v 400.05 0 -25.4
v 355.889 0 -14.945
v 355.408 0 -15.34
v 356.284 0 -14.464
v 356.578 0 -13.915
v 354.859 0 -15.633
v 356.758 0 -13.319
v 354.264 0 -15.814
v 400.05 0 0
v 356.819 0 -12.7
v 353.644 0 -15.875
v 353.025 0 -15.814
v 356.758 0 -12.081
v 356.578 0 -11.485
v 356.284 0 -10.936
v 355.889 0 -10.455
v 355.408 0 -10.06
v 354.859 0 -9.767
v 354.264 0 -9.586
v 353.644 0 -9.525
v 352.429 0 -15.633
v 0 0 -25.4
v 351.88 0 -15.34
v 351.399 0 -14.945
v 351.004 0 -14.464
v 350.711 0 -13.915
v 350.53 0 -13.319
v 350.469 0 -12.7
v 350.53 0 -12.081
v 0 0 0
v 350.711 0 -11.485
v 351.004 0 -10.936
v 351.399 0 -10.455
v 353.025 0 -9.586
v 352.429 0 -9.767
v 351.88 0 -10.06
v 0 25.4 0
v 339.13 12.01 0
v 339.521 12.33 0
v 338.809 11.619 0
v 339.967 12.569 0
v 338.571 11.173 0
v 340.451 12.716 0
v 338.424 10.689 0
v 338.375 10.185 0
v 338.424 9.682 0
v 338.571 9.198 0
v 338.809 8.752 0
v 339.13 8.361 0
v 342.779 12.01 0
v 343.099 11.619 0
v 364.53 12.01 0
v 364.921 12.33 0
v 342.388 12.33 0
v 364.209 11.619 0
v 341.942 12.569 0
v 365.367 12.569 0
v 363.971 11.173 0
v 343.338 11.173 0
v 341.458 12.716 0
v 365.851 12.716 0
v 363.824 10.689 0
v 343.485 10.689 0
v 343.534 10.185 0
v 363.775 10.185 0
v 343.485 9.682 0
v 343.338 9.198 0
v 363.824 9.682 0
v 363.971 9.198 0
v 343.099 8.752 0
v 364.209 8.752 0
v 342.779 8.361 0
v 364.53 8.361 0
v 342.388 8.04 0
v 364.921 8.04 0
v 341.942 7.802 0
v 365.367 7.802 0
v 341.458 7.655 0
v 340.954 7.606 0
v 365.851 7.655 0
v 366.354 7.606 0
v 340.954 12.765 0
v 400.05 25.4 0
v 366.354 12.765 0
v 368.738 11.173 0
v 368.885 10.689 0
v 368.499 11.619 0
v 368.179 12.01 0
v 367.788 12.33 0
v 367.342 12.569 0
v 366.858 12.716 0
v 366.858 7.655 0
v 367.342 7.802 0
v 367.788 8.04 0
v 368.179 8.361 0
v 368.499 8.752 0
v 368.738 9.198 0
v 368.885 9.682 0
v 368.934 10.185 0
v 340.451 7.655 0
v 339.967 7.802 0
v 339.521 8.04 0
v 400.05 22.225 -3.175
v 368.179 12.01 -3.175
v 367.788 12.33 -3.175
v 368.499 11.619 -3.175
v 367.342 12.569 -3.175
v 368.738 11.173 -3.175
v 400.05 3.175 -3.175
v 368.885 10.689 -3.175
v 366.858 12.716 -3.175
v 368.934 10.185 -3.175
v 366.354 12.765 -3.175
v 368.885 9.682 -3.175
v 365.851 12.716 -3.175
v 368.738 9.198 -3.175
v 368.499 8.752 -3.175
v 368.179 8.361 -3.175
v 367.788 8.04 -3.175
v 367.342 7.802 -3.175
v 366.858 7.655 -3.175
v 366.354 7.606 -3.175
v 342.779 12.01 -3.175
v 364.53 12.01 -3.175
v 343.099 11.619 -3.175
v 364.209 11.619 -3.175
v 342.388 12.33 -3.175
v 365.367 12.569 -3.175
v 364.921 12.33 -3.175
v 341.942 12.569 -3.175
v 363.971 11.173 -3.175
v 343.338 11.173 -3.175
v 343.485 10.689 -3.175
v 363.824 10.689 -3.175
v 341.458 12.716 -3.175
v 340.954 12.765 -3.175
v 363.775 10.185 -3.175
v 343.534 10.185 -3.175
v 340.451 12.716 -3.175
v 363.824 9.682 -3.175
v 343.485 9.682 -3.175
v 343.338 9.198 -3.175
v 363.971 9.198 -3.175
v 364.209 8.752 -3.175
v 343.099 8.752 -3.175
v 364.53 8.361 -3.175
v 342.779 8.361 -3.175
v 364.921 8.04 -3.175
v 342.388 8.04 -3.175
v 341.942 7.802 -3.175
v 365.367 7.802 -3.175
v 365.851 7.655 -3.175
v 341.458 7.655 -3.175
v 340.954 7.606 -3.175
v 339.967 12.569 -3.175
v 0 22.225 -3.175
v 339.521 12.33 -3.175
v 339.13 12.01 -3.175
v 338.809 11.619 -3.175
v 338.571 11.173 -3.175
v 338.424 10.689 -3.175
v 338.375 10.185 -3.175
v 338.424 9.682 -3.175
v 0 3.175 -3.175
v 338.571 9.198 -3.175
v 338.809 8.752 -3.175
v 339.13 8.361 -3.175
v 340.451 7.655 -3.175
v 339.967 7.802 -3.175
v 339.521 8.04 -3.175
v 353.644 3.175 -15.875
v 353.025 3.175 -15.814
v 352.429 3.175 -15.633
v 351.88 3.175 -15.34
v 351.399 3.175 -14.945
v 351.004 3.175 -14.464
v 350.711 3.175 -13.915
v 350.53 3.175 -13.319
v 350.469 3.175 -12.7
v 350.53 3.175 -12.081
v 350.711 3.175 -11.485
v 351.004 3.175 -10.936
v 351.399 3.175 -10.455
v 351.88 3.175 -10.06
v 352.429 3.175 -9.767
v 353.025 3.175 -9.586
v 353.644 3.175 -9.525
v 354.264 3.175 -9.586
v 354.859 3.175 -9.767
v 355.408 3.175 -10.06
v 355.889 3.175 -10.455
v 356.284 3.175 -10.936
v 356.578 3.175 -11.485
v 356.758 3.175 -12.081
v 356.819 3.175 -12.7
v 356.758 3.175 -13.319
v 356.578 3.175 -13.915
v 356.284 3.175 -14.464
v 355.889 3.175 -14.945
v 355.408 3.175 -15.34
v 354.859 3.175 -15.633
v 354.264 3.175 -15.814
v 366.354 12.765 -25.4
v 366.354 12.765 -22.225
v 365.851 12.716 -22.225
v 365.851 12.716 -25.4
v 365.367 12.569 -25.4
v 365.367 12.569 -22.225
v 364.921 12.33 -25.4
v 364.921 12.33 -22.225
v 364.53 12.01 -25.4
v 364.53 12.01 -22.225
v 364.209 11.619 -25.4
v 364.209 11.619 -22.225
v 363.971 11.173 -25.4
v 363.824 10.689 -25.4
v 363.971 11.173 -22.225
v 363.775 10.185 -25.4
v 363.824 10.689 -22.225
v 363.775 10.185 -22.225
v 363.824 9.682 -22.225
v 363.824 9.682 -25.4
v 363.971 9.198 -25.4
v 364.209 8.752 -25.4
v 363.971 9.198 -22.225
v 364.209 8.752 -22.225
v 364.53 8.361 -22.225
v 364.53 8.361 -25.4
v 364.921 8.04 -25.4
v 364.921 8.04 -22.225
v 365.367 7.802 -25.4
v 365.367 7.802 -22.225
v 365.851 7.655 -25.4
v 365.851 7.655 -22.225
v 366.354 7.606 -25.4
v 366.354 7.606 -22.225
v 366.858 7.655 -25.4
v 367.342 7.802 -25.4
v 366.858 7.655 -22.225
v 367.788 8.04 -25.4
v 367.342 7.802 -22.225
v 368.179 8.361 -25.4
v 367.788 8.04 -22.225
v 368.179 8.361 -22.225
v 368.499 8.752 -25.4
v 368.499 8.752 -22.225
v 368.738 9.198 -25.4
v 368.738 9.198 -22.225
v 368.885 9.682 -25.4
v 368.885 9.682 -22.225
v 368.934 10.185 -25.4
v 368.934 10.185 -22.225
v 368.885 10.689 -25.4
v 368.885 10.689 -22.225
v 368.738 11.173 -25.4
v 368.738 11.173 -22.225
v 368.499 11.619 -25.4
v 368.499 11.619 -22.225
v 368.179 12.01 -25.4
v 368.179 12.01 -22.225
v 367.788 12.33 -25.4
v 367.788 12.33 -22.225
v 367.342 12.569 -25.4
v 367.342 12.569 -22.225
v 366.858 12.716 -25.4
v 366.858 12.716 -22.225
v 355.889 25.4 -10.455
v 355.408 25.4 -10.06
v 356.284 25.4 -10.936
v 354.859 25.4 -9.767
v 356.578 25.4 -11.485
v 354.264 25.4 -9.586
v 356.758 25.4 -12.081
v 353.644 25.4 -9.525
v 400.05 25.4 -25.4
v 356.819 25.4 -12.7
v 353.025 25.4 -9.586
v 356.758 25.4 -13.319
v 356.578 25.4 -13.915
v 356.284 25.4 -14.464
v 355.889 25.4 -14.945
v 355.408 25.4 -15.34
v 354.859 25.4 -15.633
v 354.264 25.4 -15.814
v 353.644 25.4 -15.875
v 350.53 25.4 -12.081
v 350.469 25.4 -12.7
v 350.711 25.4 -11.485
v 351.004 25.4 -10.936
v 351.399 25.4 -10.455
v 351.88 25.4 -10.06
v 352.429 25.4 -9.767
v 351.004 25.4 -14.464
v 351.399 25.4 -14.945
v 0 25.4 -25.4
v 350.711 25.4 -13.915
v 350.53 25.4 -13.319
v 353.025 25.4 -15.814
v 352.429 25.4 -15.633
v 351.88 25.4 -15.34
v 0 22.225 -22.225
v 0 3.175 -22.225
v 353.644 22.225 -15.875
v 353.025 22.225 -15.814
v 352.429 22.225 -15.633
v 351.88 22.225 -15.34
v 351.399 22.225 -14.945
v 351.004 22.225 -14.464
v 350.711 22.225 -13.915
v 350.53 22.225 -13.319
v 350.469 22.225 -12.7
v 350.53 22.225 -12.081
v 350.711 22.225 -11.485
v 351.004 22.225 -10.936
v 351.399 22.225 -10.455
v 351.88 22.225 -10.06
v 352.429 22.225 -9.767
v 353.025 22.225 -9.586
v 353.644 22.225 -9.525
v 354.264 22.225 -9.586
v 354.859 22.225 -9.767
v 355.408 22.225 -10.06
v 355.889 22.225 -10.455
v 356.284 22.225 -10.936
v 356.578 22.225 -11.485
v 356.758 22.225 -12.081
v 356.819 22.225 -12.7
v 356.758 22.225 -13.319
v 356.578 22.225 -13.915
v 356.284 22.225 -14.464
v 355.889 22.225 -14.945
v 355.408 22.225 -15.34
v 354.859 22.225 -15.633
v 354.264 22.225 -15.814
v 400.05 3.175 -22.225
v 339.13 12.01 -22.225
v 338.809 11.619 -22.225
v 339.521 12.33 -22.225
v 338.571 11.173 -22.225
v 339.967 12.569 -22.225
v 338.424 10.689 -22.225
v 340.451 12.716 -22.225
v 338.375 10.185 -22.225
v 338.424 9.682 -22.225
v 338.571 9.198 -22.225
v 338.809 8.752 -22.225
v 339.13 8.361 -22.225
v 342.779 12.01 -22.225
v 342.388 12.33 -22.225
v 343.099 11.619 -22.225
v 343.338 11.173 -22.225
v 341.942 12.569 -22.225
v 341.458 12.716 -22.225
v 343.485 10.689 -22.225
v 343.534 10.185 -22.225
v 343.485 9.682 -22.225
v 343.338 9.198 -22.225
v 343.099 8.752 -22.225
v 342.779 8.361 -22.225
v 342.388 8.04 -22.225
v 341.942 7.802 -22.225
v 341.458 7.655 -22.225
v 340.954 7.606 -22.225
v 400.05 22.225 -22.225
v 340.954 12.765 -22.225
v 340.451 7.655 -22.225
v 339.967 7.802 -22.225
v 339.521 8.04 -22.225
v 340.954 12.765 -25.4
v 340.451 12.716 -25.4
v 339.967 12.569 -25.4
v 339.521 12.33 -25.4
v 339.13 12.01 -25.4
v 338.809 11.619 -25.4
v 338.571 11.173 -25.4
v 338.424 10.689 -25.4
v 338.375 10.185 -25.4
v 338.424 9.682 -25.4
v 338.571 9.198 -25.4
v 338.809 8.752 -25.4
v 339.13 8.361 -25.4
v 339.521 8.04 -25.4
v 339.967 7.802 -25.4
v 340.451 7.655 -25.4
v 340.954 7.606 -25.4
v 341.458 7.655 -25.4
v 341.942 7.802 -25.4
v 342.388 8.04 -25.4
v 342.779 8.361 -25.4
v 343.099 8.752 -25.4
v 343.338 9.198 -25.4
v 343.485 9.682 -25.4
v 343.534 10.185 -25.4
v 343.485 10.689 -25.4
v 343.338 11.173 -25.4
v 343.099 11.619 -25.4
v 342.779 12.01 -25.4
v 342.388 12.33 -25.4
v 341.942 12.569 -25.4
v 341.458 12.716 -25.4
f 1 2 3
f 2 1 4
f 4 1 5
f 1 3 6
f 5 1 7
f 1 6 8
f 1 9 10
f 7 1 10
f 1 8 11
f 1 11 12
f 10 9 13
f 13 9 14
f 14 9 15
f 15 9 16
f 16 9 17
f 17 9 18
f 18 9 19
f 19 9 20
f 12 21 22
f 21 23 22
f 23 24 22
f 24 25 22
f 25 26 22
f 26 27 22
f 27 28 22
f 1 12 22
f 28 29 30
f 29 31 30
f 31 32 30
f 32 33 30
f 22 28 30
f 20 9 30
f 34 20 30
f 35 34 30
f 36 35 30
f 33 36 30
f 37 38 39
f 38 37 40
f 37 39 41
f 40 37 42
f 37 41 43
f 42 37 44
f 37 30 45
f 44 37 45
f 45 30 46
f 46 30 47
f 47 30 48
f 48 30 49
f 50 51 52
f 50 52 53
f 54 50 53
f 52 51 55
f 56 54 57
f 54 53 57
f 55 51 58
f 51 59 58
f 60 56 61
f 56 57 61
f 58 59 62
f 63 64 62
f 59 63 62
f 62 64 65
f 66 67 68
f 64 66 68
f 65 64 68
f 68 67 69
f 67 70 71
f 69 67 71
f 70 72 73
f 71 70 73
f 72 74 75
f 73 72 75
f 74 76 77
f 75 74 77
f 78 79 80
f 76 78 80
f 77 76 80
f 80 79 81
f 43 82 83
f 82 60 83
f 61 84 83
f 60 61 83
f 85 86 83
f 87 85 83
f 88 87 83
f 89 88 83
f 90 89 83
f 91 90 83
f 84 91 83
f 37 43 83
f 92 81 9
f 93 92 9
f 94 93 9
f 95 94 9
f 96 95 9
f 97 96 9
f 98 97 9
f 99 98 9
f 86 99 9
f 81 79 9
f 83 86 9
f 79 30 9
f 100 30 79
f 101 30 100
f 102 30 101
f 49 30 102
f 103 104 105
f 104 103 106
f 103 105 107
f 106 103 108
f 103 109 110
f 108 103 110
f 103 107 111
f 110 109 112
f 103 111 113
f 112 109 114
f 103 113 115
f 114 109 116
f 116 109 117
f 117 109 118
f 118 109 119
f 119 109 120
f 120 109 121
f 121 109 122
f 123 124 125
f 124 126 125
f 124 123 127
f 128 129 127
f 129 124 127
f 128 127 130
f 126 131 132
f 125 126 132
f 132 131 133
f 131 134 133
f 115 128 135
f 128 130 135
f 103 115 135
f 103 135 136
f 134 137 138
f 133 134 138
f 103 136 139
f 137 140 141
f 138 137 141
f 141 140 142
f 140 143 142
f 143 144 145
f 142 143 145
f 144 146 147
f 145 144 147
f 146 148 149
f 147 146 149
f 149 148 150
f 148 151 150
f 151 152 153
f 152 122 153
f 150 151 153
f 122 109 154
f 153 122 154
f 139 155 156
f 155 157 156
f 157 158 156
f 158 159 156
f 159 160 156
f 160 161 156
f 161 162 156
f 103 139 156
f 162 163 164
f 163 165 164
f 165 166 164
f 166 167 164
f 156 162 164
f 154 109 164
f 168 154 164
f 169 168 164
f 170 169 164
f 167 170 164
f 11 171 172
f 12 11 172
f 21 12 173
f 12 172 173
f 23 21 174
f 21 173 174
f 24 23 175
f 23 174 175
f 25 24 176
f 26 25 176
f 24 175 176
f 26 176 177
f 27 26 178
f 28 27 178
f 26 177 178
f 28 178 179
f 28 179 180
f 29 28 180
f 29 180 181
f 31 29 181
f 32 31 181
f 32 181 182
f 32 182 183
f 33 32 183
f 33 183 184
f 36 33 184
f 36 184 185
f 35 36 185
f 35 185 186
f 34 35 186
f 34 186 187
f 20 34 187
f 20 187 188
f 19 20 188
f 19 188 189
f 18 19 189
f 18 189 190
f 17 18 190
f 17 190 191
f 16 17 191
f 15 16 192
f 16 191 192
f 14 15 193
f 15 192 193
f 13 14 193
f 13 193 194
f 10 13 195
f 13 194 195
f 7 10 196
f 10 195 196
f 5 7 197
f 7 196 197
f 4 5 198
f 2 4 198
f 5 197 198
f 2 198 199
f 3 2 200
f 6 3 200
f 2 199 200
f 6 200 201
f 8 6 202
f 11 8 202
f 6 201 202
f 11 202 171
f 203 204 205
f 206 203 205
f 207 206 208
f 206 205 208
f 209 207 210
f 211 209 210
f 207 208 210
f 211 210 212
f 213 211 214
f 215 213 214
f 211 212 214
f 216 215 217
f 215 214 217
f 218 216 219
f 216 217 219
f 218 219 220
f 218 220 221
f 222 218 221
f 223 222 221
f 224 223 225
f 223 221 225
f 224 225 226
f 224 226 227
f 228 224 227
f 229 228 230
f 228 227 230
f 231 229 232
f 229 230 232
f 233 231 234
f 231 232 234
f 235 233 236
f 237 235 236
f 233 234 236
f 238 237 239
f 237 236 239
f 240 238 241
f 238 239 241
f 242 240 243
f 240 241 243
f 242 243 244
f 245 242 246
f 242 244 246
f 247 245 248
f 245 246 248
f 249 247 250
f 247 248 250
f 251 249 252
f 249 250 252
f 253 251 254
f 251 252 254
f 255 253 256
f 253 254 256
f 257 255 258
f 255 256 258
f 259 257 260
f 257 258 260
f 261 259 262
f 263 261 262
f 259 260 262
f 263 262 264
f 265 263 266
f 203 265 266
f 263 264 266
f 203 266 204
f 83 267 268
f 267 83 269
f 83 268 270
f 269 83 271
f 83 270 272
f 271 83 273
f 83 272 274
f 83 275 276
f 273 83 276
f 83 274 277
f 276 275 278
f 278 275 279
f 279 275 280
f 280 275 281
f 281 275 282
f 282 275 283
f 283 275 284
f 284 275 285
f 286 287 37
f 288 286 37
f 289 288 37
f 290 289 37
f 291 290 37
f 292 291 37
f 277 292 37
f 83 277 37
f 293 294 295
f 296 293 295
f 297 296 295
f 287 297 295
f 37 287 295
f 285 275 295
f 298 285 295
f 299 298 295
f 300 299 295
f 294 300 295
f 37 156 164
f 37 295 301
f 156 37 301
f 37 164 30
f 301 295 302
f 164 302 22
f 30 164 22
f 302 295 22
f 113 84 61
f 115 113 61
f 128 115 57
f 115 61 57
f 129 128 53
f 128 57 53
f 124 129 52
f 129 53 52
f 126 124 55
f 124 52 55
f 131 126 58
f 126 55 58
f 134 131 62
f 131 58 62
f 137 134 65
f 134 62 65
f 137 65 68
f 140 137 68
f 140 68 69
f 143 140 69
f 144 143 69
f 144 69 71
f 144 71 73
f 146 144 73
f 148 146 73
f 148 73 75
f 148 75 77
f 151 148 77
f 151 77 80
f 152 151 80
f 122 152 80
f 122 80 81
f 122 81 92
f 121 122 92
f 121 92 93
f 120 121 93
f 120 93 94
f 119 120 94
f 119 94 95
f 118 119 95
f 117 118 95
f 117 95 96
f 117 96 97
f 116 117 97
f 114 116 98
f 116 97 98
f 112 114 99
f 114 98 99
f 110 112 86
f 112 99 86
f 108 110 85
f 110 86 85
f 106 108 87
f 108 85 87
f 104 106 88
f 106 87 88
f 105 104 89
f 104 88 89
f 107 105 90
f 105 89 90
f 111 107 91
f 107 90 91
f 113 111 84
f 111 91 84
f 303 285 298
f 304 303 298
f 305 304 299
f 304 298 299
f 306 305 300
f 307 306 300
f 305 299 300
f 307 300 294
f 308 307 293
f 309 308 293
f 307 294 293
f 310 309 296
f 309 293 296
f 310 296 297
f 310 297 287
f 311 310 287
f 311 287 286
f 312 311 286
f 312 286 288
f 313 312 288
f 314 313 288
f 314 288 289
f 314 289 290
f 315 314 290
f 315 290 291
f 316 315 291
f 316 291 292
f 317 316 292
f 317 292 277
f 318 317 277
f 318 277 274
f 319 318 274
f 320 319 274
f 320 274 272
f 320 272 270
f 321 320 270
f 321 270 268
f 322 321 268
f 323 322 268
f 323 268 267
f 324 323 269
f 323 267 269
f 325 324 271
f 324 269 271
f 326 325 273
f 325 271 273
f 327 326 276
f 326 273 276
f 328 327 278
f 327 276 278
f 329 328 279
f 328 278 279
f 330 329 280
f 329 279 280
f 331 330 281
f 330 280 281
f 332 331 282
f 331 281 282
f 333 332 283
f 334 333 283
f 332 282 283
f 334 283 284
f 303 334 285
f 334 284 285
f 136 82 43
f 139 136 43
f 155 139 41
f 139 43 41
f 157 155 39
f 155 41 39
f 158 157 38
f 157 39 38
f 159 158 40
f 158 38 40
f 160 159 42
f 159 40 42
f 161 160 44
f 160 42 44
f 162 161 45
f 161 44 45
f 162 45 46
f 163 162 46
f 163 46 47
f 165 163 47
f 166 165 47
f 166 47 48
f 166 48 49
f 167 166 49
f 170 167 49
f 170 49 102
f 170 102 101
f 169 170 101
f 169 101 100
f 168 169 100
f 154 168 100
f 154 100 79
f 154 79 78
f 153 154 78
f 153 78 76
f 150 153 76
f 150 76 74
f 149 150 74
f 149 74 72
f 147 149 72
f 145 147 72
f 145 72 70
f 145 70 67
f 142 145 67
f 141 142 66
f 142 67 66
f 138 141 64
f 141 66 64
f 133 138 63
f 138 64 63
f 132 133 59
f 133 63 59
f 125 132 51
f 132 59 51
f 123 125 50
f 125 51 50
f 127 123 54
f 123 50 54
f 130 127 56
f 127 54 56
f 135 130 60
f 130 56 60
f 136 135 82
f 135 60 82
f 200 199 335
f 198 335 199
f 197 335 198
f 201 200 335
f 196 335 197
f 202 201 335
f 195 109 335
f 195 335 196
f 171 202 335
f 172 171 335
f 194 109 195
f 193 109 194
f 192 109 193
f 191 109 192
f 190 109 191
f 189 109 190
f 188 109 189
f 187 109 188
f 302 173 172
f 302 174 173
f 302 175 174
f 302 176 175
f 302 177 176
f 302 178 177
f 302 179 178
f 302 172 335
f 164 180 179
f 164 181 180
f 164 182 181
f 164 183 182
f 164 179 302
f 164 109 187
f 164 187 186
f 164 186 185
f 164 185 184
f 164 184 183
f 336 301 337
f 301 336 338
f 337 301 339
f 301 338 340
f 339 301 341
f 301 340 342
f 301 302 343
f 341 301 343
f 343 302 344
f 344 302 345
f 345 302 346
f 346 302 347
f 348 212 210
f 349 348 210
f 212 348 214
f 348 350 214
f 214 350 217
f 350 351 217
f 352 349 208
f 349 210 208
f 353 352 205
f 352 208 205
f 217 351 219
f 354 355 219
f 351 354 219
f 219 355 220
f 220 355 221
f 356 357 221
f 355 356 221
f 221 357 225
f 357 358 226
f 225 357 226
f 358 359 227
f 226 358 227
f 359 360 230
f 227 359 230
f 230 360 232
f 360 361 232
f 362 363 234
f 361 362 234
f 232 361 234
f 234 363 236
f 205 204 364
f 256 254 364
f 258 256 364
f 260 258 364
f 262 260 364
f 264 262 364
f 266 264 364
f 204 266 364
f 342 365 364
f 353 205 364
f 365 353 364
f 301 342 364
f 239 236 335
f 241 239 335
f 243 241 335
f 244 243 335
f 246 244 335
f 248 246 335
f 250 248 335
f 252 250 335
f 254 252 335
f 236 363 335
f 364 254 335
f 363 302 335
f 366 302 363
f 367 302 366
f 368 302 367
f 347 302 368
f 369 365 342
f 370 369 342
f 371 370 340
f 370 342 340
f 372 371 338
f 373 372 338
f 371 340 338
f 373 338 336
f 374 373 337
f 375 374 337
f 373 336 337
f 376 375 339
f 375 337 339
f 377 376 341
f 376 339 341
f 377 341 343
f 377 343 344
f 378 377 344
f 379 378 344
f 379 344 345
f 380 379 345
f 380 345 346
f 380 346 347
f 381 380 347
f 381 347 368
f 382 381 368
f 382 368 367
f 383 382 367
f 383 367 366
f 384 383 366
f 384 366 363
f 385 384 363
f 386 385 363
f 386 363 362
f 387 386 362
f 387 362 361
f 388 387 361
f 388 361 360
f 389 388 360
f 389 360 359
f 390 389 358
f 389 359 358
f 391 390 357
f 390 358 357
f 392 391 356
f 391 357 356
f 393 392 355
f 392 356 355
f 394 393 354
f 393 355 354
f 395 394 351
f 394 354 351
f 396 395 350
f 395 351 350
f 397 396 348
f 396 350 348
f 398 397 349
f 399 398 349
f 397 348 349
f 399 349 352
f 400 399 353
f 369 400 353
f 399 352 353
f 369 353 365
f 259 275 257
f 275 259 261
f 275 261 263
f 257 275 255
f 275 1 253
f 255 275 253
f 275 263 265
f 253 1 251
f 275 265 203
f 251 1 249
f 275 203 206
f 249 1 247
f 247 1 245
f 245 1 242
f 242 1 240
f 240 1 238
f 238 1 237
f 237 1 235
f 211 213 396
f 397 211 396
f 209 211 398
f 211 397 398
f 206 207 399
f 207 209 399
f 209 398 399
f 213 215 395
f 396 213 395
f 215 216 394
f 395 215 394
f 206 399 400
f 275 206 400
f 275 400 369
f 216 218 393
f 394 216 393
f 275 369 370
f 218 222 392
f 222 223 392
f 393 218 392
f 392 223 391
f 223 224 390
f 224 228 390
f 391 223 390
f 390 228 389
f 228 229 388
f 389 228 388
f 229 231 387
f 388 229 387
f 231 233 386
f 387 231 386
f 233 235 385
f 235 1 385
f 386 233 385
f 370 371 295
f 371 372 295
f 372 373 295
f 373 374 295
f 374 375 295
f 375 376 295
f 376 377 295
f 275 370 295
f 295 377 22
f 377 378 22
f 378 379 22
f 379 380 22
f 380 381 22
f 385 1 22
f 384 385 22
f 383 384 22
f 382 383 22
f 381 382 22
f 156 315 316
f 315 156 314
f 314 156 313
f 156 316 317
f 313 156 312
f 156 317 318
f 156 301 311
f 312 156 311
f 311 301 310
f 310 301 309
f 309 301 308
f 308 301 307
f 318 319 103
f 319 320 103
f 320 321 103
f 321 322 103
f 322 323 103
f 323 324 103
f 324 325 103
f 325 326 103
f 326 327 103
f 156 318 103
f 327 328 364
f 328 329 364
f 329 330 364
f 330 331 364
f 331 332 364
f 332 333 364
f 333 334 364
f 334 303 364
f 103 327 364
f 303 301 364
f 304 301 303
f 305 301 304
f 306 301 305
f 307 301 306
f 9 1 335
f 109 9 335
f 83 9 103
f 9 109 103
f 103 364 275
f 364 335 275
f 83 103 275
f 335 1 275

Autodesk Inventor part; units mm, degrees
ref_plane "YZ Plane" through (0, 0, 0) normal (1, 0, 0) x (0, 1, 0)
ref_plane "XZ Plane" through (0, 0, 0) normal (0, 1, 0) x (-1, 0, 0)
sketch "Sketch1" plane through (0, 0, 0) normal (0, 1, 0) x (-1, 0, 0)
  line L0 (0, 0) -> (-400.05, 0)
  line L1 (-400.05, 0) -> (-400.05, -25.4)
  line L2 (-400.05, -25.4) -> (0, -25.4)
  line L3 (0, -25.4) -> (0, 0)
  dimension "d0" = 400.05
  dimension "d1" = 25.4
extrude "Extrusion1" add sketch "Sketch1" along normal blind 3.175
ref_plane "Work Plane1" through (200.025, 0, 0) normal (1, 0, 0) x (0, 0, -1)
sketch "Sketch7" plane through (0, 3.175, 0) normal (0, 1, 0) x (1, 0, 0)
  line L0 (400.05, 0) -> (400.05, 25.4) projected
  line L1 (0, 0) -> (400.05, 0)
  line L2 (400.05, 0) -> (400.05, 3.175)
  line L3 (400.05, 3.175) -> (0, 3.175)
  line L4 (0, 3.175) -> (0, 0)
  dimension "d49" = 3.175
extrude "Extrusion2" add sketch "Sketch7" along normal blind 22.225
ref_plane "Work Plane2" through (0, 0, -12.7) normal (0, 0, 1) x (1, 0, 0)
mirror "Mirror2" about plane through (0, 0, -12.7) normal (0, 0, 1) of "Extrusion2"
sketch "Sketch8" plane through (0, 3.175, -22.225) normal (0, 0, 1) x (1, 0, 0)
  line L0 (400.05, 22.225) -> (0, 22.225) projected
  line L1 (400.05, 22.225) -> (0, 22.225)
  line L2 (0, 22.225) -> (0, 19.05)
  line L3 (0, 19.05) -> (400.05, 19.05)
  line L4 (400.05, 19.05) -> (400.05, 22.225)
  point P0 (0, -3.175)
  dimension "d52" = 400.05
  dimension "d53" = 3.175
extrude "Extrusion3" add sketch "Sketch8" along normal blind 19.05
ref_plane "Work Plane3" through (0, 12.7, 0) normal (0, -1, 0) x (1, 0, 0)
sketch "Sketch10" plane through (400.05, 0, -25.4) normal (0, 0, -1) x (-1, 0, 0)
  line L0 (0, 0) -> (400.05, 0) projected
  line L1 (0, 0) -> (0, 25.4) projected
  point P0 (59.0956, 10.1854)
  dimension "d61" = 10.1854
  dimension "d62" = 59.0956
sketch "Sketch11" plane through (400.05, 0, -25.4) normal (0, 0, -1) x (-1, 0, 0)
  line L0 (0, 0) -> (400.05, 0) projected
  line L1 (0, 0) -> (0, 25.4) projected
  point P0 (33.6956, 10.1854)
  dimension "d70" = 10.1854
  dimension "d71" = 33.6956
hole "Hole8" at (340.9544, 10.1854, -25.4) direction (0, 0, 1) diameter 5.1594 end through all
hole "Hole9" at (366.3544, 10.1854, -25.4) direction (0, 0, 1) diameter 5.1594 end through all
sketch "Sketch14" plane through (0, 0, 0) normal (0, -1, 0) x (1, 0, 0)
  line L0 (400.05, 0) -> (400.05, -25.4) projected
  line L1 (400.05, -25.4) -> (0, -25.4) projected
  point P0 (0, 0)
  point P1 (353.6442, -12.7)
  dimension "d97" = 46.4058
  dimension "d98" = 12.7
hole "Hole10" at (353.6442, 0, -12.7) direction (0, 1, 0) diameter 6.35 end through all
equation "\"d84\" = Thickness"
equation "\"d91\" = Thickness"
equation "\"d104\" = Thickness"
equation "\"BendRadius\" = Thickness"
equation "\"BendReliefWidth\" = Thickness"
equation "\"BendReliefDepth\" = 0.5 * Thickness"
equation "\"CornerReliefSize\" = 4 * Thickness"
equation "\"MinimumRemnant\" = 2 * Thickness"
equation "\"TransitionRadius\" = BendRadius"
equation "\"JacobiRadiusSize\" = BendRadius"
equation "\"GapSize\" = Thickness"
equation "\"Thickness\" = 3.048"
properties part number "Large crossbeam" material "Aluminum 6061"
